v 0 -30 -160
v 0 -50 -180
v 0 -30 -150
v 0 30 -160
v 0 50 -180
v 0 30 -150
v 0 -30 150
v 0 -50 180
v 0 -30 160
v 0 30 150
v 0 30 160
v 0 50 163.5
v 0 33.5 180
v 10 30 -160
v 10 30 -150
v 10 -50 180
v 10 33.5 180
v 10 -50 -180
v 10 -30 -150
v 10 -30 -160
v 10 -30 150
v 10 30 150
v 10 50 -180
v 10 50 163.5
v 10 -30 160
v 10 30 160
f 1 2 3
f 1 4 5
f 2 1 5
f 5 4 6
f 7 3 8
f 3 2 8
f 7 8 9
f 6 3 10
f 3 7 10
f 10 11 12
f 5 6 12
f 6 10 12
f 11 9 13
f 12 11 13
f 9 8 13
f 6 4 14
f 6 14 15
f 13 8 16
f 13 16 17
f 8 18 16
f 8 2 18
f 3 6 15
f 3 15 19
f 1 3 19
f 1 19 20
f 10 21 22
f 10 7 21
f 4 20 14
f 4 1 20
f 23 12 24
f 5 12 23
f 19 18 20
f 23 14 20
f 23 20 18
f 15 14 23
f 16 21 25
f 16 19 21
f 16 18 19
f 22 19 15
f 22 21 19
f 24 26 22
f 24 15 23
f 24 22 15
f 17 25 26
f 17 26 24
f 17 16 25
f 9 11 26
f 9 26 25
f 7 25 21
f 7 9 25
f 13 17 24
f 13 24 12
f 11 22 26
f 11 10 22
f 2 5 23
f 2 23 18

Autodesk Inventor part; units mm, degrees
ref_plane "YZ Plane" through (0, 0, 0) normal (1, 0, 0) x (0, 1, 0)
ref_plane "XZ Plane" through (0, 0, 0) normal (0, 1, 0) x (-1, 0, 0)
ref_plane "XY Plane" through (0, 0, 0) normal (0, 0, 1) x (1, 0, 0)
sketch "Sketch1" plane through (0, 0, 0) normal (1, 0, 0) x (0, 1, 0)
  line L0 (-50, 160) -> (50, 160)
  line L1 (50, 160) -> (50, -160)
  line L2 (50, -160) -> (-50, -160)
  line L3 (-50, -160) -> (-50, 160)
  line L4 (-50, 160) -> (50, -160) construction
  line L5 (50, 160) -> (-50, -160) construction
  point P0 (0, 0)
  dimension "d0" = 320
  dimension "d1" = 100
extrude "Extrusion1" add sketch "Sketch1" along normal blind 10
sketch "Sketch2" plane through (0, 0, 0) normal (-1, 0, 0) x (0, 0, 1)
  line L0 (-160, -50) -> (-160, 50) projected
  line L1 (160, -50) -> (-160, -50) projected
  line L2 (160, 50) -> (160, -50) projected
  line L3 (-160, 50) -> (160, 50) projected
  line L4 (180, 50) -> (-180, 50)
  line L5 (-180, 50) -> (-180, -50)
  line L6 (-180, -50) -> (180, -50)
  line L7 (180, -50) -> (180, 50)
  line L8 (180, 50) -> (-180, -50) construction
  line L9 (-180, 50) -> (180, -50) construction
  line L10 (150, 30) -> (170, 30)
  line L11 (170, 30) -> (170, -30)
  line L12 (170, -30) -> (150, -30)
  line L13 (150, -30) -> (150, 30)
  line L14 (160, 50) -> (160, -50) projected
  line L15 (150, 30) -> (170, -30) construction
  line L16 (170, 30) -> (150, -30) construction
  point P0 (0, 0)
  point P1 (160, 0)
  point P2 (160, 30)
  point P3 (160, -30)
  dimension "d4" = 20
  dimension "d5" = 10
  dimension "d6" = 60
extrude "Extrusion2" add sketch "Sketch2" against normal blind 10 contours L2 L12 L11 L10 L4 L7 L6 | L2 L10 L11 L12
extrude "Extrusion3" cut sketch "Sketch2" against normal blind 36.25 contours L12 L13 L10 L2
mirror "Mirror1" about plane through (0, 0, 0) normal (0, 0, 1) of "Extrusion3", "Extrusion2"
chamfer "Chamfer1" distance 16.5 angle 45 1 edges at (5, 50, 180)
properties part number "02_Tam_hong" material "Stainless Steel, Austenitic"
